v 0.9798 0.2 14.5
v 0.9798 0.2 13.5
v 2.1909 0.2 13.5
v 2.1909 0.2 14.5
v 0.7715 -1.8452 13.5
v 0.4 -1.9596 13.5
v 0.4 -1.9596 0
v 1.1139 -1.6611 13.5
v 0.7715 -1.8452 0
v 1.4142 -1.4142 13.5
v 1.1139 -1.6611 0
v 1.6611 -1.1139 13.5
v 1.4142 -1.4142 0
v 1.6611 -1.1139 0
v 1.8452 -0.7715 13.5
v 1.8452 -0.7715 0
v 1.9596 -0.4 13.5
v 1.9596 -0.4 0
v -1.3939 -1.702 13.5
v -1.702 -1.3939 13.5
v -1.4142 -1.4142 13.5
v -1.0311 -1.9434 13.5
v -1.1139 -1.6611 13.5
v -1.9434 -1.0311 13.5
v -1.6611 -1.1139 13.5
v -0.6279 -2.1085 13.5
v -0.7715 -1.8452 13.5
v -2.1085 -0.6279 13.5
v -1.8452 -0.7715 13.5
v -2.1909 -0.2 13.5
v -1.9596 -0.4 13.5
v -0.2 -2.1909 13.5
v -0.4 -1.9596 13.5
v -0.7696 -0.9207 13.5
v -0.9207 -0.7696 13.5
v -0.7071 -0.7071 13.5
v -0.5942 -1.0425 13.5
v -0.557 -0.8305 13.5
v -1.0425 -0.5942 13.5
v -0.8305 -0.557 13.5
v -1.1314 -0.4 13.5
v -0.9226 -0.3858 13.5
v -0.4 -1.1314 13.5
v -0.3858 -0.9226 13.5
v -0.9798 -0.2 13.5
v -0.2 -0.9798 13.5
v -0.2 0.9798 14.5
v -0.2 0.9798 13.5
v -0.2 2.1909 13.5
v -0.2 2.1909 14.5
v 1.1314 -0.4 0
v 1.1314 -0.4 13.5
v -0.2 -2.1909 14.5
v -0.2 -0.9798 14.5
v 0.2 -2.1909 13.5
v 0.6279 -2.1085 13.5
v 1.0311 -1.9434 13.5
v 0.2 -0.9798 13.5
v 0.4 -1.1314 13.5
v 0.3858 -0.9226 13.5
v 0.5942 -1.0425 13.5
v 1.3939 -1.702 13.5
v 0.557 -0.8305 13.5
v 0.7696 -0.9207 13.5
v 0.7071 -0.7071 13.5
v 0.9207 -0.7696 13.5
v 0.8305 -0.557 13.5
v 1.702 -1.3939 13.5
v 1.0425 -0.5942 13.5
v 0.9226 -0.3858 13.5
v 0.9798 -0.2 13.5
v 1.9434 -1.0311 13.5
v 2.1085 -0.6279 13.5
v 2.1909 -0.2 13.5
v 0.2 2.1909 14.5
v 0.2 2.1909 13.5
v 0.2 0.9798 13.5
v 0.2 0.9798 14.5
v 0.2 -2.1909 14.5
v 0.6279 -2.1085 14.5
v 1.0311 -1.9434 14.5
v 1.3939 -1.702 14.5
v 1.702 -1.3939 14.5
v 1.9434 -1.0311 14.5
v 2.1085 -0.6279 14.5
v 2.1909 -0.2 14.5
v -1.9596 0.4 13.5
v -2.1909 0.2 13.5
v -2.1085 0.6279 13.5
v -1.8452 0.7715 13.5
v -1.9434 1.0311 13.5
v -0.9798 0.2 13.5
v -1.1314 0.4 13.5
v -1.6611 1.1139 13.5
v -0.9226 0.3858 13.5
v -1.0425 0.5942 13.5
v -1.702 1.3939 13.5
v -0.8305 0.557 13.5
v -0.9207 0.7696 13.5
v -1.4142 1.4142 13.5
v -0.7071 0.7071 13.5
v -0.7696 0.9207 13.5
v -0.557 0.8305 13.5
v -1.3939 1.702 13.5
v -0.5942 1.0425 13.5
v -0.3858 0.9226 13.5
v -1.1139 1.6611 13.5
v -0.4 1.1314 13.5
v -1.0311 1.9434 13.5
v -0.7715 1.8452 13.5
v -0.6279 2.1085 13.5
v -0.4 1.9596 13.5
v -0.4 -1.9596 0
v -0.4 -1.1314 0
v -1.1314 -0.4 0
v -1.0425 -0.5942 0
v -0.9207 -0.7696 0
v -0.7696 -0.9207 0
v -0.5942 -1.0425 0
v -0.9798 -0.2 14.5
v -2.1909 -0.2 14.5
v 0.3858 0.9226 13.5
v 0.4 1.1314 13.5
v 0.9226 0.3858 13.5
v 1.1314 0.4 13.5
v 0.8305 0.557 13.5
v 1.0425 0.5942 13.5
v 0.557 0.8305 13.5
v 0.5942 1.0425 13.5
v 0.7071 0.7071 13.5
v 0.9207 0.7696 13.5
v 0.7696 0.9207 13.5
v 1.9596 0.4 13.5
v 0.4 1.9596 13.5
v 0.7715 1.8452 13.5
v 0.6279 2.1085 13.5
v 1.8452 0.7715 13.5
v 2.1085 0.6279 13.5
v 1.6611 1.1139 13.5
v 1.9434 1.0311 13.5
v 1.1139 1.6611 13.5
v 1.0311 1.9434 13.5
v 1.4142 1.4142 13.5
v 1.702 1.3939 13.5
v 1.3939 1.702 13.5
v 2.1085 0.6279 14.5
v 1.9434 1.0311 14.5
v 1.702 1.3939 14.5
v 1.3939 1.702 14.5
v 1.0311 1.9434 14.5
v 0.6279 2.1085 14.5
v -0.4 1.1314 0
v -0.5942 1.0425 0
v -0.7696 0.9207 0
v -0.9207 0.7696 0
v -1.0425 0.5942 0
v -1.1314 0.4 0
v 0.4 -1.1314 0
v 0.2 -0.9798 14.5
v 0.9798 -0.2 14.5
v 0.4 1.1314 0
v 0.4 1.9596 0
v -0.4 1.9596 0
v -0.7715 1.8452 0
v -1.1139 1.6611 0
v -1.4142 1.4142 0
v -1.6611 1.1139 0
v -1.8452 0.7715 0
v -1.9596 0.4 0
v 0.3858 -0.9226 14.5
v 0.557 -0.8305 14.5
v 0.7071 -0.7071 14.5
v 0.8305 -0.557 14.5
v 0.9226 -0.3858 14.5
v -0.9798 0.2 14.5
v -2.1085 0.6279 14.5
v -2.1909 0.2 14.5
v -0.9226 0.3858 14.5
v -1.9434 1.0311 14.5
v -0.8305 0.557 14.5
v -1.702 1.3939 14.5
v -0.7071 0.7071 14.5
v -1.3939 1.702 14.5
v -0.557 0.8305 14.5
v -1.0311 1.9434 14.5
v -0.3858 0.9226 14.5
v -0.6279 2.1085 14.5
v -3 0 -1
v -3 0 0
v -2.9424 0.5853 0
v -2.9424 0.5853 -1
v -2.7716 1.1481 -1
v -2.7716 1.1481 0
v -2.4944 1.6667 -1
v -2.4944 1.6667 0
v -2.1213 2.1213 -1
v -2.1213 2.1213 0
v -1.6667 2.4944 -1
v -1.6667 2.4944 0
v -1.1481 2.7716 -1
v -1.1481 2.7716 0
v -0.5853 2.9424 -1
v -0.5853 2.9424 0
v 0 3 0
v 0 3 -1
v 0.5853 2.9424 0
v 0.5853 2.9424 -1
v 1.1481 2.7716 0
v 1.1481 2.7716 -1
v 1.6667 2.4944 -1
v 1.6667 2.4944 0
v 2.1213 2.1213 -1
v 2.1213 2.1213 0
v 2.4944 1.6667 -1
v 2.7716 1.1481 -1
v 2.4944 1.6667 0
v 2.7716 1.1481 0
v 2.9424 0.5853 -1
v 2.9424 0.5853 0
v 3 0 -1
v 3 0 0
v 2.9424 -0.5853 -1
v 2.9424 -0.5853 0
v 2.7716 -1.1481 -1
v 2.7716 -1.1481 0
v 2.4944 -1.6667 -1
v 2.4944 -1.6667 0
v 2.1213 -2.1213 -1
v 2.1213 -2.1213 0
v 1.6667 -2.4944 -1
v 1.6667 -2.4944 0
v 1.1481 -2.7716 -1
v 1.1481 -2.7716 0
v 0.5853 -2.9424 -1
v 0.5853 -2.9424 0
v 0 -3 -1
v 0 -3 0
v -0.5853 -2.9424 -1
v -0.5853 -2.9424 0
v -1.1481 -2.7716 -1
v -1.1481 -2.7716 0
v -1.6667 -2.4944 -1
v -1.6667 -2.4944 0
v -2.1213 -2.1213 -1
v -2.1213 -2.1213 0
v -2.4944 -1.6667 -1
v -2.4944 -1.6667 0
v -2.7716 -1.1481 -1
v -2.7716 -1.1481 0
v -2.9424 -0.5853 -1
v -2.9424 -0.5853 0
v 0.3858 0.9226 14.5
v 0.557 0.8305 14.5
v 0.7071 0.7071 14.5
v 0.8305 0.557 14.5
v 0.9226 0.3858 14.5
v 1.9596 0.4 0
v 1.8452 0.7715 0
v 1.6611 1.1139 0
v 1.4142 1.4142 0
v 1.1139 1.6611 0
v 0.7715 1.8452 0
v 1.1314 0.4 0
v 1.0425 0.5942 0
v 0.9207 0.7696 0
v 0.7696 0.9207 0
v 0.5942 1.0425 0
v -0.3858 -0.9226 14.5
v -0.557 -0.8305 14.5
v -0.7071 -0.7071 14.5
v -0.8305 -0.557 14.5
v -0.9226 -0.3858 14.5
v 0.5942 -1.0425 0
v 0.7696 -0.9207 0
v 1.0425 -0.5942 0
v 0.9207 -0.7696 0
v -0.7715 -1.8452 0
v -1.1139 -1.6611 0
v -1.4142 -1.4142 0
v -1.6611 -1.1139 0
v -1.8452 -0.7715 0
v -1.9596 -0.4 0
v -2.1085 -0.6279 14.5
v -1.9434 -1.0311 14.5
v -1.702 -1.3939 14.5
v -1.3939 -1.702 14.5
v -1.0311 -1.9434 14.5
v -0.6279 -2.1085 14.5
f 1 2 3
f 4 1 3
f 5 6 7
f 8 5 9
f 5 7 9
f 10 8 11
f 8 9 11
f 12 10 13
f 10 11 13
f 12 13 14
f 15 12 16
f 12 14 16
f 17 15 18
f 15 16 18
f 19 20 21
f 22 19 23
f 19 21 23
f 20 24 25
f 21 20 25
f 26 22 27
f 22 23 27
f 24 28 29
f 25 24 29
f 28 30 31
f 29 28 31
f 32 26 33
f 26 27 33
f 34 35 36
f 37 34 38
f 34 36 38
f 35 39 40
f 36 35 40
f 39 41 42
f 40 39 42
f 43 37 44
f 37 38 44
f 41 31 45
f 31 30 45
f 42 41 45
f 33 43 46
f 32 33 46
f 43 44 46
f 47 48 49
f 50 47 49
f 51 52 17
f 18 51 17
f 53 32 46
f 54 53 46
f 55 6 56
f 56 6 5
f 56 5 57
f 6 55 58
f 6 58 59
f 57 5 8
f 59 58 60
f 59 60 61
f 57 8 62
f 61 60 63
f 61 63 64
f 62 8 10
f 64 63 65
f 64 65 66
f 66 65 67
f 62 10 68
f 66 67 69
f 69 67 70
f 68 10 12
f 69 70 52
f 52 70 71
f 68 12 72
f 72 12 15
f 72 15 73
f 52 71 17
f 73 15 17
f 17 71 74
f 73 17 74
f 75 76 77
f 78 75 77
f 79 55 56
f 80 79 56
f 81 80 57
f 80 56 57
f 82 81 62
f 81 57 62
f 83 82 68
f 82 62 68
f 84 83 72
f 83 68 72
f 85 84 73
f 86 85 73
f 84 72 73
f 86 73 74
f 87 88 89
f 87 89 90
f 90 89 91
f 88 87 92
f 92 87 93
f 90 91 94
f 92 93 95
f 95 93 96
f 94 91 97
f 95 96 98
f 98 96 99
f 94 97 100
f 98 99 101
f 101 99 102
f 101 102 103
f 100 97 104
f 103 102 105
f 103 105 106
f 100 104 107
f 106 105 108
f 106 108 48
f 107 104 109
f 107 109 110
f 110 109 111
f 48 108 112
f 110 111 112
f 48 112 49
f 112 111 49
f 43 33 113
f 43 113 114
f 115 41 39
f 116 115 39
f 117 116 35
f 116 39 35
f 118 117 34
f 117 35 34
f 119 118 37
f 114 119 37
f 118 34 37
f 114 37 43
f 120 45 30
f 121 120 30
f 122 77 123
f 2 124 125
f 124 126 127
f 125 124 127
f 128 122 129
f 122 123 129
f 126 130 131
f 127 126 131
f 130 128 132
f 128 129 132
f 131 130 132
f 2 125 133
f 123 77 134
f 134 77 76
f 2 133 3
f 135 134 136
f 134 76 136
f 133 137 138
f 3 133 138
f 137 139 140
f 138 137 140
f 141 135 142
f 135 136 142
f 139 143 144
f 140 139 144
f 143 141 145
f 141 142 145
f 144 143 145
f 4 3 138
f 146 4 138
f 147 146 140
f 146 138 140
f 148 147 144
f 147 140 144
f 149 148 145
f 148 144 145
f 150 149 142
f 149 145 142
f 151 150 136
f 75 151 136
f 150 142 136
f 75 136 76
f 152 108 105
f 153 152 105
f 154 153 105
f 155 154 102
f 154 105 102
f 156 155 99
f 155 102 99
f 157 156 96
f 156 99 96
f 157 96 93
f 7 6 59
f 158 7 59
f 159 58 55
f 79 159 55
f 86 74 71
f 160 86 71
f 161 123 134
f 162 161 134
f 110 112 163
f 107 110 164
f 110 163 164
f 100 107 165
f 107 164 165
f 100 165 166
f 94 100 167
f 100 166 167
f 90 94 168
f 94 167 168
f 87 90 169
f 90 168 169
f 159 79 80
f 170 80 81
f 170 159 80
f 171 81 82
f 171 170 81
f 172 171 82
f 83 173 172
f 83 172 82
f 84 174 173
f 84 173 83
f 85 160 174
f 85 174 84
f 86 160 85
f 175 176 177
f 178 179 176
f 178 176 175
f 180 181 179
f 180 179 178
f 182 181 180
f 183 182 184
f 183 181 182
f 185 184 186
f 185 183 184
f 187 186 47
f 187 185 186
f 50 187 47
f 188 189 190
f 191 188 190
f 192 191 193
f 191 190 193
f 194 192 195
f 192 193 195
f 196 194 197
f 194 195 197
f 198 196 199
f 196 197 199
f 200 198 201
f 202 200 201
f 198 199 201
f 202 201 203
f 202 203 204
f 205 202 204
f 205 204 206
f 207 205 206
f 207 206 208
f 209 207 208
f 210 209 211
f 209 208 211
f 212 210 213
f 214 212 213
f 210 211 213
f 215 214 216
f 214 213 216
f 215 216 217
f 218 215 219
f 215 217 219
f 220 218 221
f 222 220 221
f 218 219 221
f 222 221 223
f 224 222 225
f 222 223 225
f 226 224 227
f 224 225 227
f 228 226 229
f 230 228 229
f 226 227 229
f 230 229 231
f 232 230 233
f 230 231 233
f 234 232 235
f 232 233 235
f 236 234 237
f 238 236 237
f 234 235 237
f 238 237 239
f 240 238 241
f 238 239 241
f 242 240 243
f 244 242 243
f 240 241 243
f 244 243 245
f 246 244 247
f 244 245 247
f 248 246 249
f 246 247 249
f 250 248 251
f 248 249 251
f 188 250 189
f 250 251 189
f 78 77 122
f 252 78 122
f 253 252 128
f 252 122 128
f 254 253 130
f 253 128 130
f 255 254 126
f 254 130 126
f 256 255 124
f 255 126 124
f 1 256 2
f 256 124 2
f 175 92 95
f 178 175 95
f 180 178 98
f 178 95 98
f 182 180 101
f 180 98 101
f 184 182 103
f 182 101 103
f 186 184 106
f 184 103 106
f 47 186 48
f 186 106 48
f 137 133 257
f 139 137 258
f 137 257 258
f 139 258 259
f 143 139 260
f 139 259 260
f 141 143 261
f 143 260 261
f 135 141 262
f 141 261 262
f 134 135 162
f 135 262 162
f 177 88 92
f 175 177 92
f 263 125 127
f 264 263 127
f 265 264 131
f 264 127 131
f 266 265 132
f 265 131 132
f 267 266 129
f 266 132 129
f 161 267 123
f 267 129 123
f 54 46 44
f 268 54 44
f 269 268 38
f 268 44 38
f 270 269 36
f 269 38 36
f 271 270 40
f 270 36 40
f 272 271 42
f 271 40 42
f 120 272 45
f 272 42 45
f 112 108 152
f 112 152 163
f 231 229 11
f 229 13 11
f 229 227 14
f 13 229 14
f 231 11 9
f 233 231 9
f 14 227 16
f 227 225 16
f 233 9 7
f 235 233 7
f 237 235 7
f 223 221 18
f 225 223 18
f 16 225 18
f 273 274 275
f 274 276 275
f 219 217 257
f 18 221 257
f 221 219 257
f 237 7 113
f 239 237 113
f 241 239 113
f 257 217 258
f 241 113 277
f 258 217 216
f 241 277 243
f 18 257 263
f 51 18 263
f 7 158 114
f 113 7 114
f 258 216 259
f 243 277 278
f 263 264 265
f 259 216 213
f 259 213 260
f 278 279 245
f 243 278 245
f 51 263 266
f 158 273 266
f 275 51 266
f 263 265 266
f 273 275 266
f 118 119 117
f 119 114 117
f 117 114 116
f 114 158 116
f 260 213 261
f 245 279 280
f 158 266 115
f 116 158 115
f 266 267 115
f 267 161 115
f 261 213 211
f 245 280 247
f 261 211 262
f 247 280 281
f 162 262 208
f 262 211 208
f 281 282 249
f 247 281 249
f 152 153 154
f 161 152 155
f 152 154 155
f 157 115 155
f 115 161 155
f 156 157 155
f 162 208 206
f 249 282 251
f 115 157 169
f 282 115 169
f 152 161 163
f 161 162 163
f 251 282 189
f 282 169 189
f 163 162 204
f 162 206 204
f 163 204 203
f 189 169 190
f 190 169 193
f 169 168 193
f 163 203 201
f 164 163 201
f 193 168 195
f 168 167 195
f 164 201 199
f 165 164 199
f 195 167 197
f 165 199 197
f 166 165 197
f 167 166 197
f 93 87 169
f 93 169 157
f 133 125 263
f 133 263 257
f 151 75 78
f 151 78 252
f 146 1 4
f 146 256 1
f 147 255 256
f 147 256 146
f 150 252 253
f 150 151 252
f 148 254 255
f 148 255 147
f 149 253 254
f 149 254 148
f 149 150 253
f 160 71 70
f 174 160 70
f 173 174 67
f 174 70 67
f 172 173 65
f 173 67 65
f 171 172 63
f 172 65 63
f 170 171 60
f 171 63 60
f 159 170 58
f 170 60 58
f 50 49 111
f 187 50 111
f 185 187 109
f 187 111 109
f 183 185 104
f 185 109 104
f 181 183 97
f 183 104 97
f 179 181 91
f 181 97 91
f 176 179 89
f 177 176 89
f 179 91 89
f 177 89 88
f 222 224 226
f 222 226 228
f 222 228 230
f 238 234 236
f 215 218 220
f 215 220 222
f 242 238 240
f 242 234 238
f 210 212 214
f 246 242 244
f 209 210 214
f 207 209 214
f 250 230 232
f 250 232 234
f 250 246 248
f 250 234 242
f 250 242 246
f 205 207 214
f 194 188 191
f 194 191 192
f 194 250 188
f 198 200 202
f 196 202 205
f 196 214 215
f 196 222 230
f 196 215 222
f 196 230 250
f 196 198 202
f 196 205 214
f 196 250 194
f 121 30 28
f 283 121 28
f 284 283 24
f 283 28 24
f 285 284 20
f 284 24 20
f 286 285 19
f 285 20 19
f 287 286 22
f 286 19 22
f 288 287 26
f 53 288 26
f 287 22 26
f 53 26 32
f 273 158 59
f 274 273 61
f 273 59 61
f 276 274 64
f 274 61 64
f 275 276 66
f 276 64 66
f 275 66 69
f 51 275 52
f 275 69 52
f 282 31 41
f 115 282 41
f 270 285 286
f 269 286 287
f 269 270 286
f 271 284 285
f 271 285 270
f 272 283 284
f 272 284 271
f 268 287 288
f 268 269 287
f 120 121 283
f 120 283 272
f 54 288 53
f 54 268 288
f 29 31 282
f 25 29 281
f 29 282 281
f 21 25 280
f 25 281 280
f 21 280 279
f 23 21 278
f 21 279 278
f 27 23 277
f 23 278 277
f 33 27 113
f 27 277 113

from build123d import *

# Parameters (mm, degrees)
SKETCH1_R           = 2
BOSS_EXTRUDE1_DEPTH = 13.5
SKETCH2_R           = 1.2
CUT_EXTRUDE1_DEPTH  = 14.793114224
SKETCH3_W           = 0.8
SKETCH3_H           = 6.59267807
SKETCH3_W_2         = 7.006923124
SKETCH3_H_2         = 0.8
CUT_EXTRUDE3_DEPTH  = 14.793114224
BOSS_EXTRUDE2_DEPTH = 1
SKETCH5_R           = 3
BOSS_EXTRUDE3_DEPTH = 1


with BuildPart() as part:
    # Sketch1 → Boss-Extrude1 (new body)
    with BuildSketch(Plane.XY):
        Circle(SKETCH1_R)
    extrude(amount=BOSS_EXTRUDE1_DEPTH)

    # Sketch2 → Cut-Extrude1 (cut, through all)
    with BuildSketch(Plane.XY.offset(13.5)):
        Circle(SKETCH2_R)
    extrude(amount=-CUT_EXTRUDE1_DEPTH, mode=Mode.SUBTRACT)

    # Sketch3 → Cut-Extrude3 (cut, through all)
    with BuildSketch(Plane.XY.offset(13.5)):
        Rectangle(SKETCH3_W, SKETCH3_H)
        Rectangle(SKETCH3_W_2, SKETCH3_H_2)
    extrude(amount=-CUT_EXTRUDE3_DEPTH, mode=Mode.SUBTRACT)


with BuildPart() as cut_extrude3_piece_1:
    # of the separate pieces the step leaves, piece 1, a body of its own (cut_extrude3_pieces)
    add(part.part.solids().sort_by_distance((1.959591794, 0.4, 0))[0])



with BuildPart() as cut_extrude3_piece_2:
    # of the separate pieces the step leaves, piece 2, a body of its own (cut_extrude3_pieces)
    add(part.part.solids().sort_by_distance((0.4, -1.959591794, 0))[0])


with BuildPart() as cut_extrude3_piece_3:
    # of the separate pieces the step leaves, piece 3, a body of its own (cut_extrude3_pieces)
    add(part.part.solids().sort_by_distance((-1.959591794, -0.4, 0))[0])


with BuildPart() as cut_extrude3_piece_4:
    # of the separate pieces the step leaves, piece 4, a body of its own (cut_extrude3_pieces)
    add(part.part.solids().sort_by_distance((-0.4, 1.959591794, 0))[0])


with BuildPart() as cut_extrude3_piece_1_1:
    add(cut_extrude3_piece_1.part)

    add(cut_extrude3_piece_2.part)  # Boss-Extrude2 merges Cut-Extrude3 piece 2

    add(cut_extrude3_piece_3.part)  # Boss-Extrude2 merges Cut-Extrude3 piece 3

    add(cut_extrude3_piece_4.part)  # Boss-Extrude2 merges Cut-Extrude3 piece 4
    # Sketch4 → Boss-Extrude2 (add)
    with BuildSketch(Plane.XY.offset(13.5)):
        with BuildLine():
            Line((-2.19089023, 0.2), (-0.979795897, 0.2))
            ThreePointArc((-0.979795897, 0.2), (-0.707106781, 0.707106781), (-0.2, 0.979795897))
            Line((-0.2, 0.979795897), (-0.2, 2.19089023))
            ThreePointArc((-0.2, 2.19089023), (-1.555634919, 1.555634919), (-2.19089023, 0.2))
        make_face()
        with BuildLine():
            Line((0.979795897, 0.2), (2.19089023, 0.2))
            ThreePointArc((2.19089023, 0.2), (1.555634919, 1.555634919), (0.2, 2.19089023))
            Line((0.2, 2.19089023), (0.2, 0.979795897))
            ThreePointArc((0.2, 0.979795897), (0.707106781, 0.707106781), (0.979795897, 0.2))
        make_face()
        with BuildLine():
            Line((0.2, -0.979795897), (0.2, -2.19089023))
            ThreePointArc((0.2, -2.19089023), (1.555634919, -1.555634919), (2.19089023, -0.2))
            Line((2.19089023, -0.2), (0.979795897, -0.2))
            ThreePointArc((0.979795897, -0.2), (0.707106781, -0.707106781), (0.2, -0.979795897))
        make_face()
        with BuildLine():
            Line((-0.979795897, -0.2), (-2.19089023, -0.2))
            ThreePointArc((-2.19089023, -0.2), (-1.555634919, -1.555634919), (-0.2, -2.19089023))
            Line((-0.2, -2.19089023), (-0.2, -0.979795897))
            ThreePointArc((-0.2, -0.979795897), (-0.707106781, -0.707106781), (-0.979795897, -0.2))
        make_face()
    extrude(amount=BOSS_EXTRUDE2_DEPTH)

    # Sketch5 → Boss-Extrude3 (add)
    with BuildSketch(Plane(origin=(0, 0, 0), x_dir=(-1, 0, 0), z_dir=(0, 0, -1))):
        Circle(SKETCH5_R)
    extrude(amount=BOSS_EXTRUDE3_DEPTH)


solid = cut_extrude3_piece_1_1.part
